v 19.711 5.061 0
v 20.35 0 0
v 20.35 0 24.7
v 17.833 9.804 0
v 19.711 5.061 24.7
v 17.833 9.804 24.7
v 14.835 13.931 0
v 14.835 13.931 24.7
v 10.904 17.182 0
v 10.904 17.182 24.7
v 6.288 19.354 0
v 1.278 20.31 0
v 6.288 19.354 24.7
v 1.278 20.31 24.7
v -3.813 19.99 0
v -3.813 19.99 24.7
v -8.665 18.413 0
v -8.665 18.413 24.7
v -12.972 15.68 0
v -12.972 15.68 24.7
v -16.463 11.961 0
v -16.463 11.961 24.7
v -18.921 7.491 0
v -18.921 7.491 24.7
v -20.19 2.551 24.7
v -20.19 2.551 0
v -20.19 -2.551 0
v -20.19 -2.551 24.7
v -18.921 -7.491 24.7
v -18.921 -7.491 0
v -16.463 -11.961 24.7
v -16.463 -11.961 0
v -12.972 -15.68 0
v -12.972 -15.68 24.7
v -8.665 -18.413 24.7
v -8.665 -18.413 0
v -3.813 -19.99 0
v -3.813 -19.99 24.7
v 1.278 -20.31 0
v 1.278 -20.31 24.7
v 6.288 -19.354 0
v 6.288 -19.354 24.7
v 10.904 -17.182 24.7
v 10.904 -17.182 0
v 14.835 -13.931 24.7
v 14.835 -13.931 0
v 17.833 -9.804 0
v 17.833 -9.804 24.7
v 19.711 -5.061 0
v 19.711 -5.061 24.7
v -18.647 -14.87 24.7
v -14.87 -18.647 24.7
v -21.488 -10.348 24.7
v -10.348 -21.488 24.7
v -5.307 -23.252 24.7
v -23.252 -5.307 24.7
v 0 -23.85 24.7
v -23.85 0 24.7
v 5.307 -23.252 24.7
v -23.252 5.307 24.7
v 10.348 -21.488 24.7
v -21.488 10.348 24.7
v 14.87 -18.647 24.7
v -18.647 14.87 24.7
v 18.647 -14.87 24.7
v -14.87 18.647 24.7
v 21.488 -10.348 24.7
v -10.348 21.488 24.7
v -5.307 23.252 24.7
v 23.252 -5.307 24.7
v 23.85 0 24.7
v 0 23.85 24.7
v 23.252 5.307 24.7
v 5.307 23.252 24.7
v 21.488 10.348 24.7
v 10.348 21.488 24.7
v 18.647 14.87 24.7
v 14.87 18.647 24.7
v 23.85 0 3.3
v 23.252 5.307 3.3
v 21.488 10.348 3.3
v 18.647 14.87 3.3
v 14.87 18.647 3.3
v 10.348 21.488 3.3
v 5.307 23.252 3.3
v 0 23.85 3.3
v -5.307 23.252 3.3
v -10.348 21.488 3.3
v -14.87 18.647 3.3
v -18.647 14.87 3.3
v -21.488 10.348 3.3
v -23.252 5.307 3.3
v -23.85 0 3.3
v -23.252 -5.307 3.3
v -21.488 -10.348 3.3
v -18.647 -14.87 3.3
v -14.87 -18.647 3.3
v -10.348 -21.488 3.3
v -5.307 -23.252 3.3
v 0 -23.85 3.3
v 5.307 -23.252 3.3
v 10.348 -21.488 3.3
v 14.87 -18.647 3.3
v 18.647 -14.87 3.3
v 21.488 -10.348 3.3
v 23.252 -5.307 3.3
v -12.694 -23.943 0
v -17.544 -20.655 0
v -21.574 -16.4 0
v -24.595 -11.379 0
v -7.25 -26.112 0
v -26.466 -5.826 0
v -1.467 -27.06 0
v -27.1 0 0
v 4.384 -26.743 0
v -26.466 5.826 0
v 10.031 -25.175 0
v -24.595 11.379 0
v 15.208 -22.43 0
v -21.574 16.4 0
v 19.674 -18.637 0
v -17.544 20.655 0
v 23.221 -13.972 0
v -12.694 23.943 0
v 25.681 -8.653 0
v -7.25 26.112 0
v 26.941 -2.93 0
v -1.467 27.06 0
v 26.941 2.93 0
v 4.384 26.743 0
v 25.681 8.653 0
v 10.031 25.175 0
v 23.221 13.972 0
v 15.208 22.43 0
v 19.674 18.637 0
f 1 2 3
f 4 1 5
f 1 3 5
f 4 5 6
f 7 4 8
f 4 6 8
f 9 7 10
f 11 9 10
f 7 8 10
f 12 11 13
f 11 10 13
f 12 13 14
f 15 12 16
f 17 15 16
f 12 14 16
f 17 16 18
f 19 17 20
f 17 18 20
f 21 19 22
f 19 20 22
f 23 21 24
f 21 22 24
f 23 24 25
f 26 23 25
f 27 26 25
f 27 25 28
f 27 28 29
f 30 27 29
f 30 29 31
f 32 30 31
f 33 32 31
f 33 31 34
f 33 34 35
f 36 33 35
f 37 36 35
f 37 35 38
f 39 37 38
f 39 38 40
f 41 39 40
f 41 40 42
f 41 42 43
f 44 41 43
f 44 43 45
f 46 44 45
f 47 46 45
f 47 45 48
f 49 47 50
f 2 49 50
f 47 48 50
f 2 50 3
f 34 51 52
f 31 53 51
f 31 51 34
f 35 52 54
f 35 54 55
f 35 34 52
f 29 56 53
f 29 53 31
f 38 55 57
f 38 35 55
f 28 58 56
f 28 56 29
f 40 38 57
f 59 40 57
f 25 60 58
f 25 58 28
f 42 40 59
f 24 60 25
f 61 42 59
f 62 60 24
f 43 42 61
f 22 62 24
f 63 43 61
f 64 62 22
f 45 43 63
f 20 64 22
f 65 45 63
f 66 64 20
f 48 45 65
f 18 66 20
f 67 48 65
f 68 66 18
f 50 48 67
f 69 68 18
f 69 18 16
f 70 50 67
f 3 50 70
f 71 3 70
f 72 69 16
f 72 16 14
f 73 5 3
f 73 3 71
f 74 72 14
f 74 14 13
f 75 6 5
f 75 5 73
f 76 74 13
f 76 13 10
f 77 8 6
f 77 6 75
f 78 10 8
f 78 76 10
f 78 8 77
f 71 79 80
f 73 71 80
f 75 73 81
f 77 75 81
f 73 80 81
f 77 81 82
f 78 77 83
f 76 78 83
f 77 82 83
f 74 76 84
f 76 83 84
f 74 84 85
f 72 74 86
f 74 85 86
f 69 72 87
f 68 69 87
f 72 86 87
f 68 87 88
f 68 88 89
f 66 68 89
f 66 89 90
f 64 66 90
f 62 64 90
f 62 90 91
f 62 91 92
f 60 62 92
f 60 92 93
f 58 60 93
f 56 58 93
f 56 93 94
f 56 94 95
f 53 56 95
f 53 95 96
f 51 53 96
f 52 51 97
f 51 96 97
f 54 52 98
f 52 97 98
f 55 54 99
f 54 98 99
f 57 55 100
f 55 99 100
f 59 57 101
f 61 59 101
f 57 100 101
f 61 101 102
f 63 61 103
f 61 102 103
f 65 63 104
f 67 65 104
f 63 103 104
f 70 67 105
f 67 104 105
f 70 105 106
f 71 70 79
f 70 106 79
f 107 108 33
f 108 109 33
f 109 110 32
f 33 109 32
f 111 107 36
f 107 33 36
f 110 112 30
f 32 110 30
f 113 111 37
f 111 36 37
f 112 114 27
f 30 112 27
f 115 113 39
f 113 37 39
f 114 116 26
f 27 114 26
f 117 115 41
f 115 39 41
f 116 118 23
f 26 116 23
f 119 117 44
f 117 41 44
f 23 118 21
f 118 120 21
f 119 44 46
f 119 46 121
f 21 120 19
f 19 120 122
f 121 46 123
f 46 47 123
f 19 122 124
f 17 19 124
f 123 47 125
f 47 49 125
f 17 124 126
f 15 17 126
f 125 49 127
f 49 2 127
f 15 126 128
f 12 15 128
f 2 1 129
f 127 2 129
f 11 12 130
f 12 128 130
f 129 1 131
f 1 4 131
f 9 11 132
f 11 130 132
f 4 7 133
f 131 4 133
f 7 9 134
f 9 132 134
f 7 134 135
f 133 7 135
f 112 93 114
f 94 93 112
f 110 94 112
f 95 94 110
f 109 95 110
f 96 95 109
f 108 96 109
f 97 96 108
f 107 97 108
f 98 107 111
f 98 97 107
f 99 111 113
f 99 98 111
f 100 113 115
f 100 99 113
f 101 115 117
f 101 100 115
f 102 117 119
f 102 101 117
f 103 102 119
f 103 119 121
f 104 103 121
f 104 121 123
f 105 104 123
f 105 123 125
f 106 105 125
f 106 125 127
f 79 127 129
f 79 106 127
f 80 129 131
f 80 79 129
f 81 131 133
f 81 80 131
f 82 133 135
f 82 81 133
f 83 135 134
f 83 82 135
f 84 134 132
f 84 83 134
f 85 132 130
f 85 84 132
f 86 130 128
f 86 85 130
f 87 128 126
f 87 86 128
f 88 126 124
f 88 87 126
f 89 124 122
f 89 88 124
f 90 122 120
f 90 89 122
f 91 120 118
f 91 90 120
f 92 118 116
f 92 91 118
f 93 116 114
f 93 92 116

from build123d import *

# Parameters (mm, degrees)
IZIM1_R                     = 27.1
Y_KSEKLIK_EKSTR_ZYON1_DEPTH = 3.3
IZIM3_R                     = 23.85
Y_KSEKLIK_EKSTR_ZYON2_DEPTH = 21.4
IZIM6_R                     = 20.35
KES_EKSTR_ZYON1_DEPTH       = 50


with BuildPart() as part:
    # Çizim1 → Yükseklik-Ekstrüzyon1 (new body)
    with BuildSketch(Plane.XY):
        Circle(IZIM1_R)
    extrude(amount=Y_KSEKLIK_EKSTR_ZYON1_DEPTH)

    # Çizim3 → Yükseklik-Ekstrüzyon2 (add)
    with BuildSketch(Plane.XY.offset(3.3)):
        Circle(IZIM3_R)
    extrude(amount=Y_KSEKLIK_EKSTR_ZYON2_DEPTH)

    # loft up to a face of the part (loft1)
    loft([Face(Wire([part.edges().sort_by_distance((-18.551226571, -19.755049803, 0))[0]])), Face(Wire([part.edges().sort_by_distance((-16.326448476, 17.385901764, 3.3))[0]]))])

    # Çizim5 → Kes-Döndür1 (revolve, cut)
    with BuildSketch(Plane(origin=(0, 0, 0), x_dir=(1, 0, 0), z_dir=(0, 1, 0))):
        Polygon((-27.1, 0), (-23.85, -3.3), (-27.1, -3.3), align=None)
    revolve(axis=Axis((0, 0, -4.734059464), (0, 0, 1)), mode=Mode.SUBTRACT)

    # Çizim6 → Kes-Ekstrüzyon1 (cut)
    with BuildSketch(Plane.XY.offset(24.7)):
        Circle(IZIM6_R)
    extrude(amount=-KES_EKSTR_ZYON1_DEPTH, mode=Mode.SUBTRACT)


solid = part.part
